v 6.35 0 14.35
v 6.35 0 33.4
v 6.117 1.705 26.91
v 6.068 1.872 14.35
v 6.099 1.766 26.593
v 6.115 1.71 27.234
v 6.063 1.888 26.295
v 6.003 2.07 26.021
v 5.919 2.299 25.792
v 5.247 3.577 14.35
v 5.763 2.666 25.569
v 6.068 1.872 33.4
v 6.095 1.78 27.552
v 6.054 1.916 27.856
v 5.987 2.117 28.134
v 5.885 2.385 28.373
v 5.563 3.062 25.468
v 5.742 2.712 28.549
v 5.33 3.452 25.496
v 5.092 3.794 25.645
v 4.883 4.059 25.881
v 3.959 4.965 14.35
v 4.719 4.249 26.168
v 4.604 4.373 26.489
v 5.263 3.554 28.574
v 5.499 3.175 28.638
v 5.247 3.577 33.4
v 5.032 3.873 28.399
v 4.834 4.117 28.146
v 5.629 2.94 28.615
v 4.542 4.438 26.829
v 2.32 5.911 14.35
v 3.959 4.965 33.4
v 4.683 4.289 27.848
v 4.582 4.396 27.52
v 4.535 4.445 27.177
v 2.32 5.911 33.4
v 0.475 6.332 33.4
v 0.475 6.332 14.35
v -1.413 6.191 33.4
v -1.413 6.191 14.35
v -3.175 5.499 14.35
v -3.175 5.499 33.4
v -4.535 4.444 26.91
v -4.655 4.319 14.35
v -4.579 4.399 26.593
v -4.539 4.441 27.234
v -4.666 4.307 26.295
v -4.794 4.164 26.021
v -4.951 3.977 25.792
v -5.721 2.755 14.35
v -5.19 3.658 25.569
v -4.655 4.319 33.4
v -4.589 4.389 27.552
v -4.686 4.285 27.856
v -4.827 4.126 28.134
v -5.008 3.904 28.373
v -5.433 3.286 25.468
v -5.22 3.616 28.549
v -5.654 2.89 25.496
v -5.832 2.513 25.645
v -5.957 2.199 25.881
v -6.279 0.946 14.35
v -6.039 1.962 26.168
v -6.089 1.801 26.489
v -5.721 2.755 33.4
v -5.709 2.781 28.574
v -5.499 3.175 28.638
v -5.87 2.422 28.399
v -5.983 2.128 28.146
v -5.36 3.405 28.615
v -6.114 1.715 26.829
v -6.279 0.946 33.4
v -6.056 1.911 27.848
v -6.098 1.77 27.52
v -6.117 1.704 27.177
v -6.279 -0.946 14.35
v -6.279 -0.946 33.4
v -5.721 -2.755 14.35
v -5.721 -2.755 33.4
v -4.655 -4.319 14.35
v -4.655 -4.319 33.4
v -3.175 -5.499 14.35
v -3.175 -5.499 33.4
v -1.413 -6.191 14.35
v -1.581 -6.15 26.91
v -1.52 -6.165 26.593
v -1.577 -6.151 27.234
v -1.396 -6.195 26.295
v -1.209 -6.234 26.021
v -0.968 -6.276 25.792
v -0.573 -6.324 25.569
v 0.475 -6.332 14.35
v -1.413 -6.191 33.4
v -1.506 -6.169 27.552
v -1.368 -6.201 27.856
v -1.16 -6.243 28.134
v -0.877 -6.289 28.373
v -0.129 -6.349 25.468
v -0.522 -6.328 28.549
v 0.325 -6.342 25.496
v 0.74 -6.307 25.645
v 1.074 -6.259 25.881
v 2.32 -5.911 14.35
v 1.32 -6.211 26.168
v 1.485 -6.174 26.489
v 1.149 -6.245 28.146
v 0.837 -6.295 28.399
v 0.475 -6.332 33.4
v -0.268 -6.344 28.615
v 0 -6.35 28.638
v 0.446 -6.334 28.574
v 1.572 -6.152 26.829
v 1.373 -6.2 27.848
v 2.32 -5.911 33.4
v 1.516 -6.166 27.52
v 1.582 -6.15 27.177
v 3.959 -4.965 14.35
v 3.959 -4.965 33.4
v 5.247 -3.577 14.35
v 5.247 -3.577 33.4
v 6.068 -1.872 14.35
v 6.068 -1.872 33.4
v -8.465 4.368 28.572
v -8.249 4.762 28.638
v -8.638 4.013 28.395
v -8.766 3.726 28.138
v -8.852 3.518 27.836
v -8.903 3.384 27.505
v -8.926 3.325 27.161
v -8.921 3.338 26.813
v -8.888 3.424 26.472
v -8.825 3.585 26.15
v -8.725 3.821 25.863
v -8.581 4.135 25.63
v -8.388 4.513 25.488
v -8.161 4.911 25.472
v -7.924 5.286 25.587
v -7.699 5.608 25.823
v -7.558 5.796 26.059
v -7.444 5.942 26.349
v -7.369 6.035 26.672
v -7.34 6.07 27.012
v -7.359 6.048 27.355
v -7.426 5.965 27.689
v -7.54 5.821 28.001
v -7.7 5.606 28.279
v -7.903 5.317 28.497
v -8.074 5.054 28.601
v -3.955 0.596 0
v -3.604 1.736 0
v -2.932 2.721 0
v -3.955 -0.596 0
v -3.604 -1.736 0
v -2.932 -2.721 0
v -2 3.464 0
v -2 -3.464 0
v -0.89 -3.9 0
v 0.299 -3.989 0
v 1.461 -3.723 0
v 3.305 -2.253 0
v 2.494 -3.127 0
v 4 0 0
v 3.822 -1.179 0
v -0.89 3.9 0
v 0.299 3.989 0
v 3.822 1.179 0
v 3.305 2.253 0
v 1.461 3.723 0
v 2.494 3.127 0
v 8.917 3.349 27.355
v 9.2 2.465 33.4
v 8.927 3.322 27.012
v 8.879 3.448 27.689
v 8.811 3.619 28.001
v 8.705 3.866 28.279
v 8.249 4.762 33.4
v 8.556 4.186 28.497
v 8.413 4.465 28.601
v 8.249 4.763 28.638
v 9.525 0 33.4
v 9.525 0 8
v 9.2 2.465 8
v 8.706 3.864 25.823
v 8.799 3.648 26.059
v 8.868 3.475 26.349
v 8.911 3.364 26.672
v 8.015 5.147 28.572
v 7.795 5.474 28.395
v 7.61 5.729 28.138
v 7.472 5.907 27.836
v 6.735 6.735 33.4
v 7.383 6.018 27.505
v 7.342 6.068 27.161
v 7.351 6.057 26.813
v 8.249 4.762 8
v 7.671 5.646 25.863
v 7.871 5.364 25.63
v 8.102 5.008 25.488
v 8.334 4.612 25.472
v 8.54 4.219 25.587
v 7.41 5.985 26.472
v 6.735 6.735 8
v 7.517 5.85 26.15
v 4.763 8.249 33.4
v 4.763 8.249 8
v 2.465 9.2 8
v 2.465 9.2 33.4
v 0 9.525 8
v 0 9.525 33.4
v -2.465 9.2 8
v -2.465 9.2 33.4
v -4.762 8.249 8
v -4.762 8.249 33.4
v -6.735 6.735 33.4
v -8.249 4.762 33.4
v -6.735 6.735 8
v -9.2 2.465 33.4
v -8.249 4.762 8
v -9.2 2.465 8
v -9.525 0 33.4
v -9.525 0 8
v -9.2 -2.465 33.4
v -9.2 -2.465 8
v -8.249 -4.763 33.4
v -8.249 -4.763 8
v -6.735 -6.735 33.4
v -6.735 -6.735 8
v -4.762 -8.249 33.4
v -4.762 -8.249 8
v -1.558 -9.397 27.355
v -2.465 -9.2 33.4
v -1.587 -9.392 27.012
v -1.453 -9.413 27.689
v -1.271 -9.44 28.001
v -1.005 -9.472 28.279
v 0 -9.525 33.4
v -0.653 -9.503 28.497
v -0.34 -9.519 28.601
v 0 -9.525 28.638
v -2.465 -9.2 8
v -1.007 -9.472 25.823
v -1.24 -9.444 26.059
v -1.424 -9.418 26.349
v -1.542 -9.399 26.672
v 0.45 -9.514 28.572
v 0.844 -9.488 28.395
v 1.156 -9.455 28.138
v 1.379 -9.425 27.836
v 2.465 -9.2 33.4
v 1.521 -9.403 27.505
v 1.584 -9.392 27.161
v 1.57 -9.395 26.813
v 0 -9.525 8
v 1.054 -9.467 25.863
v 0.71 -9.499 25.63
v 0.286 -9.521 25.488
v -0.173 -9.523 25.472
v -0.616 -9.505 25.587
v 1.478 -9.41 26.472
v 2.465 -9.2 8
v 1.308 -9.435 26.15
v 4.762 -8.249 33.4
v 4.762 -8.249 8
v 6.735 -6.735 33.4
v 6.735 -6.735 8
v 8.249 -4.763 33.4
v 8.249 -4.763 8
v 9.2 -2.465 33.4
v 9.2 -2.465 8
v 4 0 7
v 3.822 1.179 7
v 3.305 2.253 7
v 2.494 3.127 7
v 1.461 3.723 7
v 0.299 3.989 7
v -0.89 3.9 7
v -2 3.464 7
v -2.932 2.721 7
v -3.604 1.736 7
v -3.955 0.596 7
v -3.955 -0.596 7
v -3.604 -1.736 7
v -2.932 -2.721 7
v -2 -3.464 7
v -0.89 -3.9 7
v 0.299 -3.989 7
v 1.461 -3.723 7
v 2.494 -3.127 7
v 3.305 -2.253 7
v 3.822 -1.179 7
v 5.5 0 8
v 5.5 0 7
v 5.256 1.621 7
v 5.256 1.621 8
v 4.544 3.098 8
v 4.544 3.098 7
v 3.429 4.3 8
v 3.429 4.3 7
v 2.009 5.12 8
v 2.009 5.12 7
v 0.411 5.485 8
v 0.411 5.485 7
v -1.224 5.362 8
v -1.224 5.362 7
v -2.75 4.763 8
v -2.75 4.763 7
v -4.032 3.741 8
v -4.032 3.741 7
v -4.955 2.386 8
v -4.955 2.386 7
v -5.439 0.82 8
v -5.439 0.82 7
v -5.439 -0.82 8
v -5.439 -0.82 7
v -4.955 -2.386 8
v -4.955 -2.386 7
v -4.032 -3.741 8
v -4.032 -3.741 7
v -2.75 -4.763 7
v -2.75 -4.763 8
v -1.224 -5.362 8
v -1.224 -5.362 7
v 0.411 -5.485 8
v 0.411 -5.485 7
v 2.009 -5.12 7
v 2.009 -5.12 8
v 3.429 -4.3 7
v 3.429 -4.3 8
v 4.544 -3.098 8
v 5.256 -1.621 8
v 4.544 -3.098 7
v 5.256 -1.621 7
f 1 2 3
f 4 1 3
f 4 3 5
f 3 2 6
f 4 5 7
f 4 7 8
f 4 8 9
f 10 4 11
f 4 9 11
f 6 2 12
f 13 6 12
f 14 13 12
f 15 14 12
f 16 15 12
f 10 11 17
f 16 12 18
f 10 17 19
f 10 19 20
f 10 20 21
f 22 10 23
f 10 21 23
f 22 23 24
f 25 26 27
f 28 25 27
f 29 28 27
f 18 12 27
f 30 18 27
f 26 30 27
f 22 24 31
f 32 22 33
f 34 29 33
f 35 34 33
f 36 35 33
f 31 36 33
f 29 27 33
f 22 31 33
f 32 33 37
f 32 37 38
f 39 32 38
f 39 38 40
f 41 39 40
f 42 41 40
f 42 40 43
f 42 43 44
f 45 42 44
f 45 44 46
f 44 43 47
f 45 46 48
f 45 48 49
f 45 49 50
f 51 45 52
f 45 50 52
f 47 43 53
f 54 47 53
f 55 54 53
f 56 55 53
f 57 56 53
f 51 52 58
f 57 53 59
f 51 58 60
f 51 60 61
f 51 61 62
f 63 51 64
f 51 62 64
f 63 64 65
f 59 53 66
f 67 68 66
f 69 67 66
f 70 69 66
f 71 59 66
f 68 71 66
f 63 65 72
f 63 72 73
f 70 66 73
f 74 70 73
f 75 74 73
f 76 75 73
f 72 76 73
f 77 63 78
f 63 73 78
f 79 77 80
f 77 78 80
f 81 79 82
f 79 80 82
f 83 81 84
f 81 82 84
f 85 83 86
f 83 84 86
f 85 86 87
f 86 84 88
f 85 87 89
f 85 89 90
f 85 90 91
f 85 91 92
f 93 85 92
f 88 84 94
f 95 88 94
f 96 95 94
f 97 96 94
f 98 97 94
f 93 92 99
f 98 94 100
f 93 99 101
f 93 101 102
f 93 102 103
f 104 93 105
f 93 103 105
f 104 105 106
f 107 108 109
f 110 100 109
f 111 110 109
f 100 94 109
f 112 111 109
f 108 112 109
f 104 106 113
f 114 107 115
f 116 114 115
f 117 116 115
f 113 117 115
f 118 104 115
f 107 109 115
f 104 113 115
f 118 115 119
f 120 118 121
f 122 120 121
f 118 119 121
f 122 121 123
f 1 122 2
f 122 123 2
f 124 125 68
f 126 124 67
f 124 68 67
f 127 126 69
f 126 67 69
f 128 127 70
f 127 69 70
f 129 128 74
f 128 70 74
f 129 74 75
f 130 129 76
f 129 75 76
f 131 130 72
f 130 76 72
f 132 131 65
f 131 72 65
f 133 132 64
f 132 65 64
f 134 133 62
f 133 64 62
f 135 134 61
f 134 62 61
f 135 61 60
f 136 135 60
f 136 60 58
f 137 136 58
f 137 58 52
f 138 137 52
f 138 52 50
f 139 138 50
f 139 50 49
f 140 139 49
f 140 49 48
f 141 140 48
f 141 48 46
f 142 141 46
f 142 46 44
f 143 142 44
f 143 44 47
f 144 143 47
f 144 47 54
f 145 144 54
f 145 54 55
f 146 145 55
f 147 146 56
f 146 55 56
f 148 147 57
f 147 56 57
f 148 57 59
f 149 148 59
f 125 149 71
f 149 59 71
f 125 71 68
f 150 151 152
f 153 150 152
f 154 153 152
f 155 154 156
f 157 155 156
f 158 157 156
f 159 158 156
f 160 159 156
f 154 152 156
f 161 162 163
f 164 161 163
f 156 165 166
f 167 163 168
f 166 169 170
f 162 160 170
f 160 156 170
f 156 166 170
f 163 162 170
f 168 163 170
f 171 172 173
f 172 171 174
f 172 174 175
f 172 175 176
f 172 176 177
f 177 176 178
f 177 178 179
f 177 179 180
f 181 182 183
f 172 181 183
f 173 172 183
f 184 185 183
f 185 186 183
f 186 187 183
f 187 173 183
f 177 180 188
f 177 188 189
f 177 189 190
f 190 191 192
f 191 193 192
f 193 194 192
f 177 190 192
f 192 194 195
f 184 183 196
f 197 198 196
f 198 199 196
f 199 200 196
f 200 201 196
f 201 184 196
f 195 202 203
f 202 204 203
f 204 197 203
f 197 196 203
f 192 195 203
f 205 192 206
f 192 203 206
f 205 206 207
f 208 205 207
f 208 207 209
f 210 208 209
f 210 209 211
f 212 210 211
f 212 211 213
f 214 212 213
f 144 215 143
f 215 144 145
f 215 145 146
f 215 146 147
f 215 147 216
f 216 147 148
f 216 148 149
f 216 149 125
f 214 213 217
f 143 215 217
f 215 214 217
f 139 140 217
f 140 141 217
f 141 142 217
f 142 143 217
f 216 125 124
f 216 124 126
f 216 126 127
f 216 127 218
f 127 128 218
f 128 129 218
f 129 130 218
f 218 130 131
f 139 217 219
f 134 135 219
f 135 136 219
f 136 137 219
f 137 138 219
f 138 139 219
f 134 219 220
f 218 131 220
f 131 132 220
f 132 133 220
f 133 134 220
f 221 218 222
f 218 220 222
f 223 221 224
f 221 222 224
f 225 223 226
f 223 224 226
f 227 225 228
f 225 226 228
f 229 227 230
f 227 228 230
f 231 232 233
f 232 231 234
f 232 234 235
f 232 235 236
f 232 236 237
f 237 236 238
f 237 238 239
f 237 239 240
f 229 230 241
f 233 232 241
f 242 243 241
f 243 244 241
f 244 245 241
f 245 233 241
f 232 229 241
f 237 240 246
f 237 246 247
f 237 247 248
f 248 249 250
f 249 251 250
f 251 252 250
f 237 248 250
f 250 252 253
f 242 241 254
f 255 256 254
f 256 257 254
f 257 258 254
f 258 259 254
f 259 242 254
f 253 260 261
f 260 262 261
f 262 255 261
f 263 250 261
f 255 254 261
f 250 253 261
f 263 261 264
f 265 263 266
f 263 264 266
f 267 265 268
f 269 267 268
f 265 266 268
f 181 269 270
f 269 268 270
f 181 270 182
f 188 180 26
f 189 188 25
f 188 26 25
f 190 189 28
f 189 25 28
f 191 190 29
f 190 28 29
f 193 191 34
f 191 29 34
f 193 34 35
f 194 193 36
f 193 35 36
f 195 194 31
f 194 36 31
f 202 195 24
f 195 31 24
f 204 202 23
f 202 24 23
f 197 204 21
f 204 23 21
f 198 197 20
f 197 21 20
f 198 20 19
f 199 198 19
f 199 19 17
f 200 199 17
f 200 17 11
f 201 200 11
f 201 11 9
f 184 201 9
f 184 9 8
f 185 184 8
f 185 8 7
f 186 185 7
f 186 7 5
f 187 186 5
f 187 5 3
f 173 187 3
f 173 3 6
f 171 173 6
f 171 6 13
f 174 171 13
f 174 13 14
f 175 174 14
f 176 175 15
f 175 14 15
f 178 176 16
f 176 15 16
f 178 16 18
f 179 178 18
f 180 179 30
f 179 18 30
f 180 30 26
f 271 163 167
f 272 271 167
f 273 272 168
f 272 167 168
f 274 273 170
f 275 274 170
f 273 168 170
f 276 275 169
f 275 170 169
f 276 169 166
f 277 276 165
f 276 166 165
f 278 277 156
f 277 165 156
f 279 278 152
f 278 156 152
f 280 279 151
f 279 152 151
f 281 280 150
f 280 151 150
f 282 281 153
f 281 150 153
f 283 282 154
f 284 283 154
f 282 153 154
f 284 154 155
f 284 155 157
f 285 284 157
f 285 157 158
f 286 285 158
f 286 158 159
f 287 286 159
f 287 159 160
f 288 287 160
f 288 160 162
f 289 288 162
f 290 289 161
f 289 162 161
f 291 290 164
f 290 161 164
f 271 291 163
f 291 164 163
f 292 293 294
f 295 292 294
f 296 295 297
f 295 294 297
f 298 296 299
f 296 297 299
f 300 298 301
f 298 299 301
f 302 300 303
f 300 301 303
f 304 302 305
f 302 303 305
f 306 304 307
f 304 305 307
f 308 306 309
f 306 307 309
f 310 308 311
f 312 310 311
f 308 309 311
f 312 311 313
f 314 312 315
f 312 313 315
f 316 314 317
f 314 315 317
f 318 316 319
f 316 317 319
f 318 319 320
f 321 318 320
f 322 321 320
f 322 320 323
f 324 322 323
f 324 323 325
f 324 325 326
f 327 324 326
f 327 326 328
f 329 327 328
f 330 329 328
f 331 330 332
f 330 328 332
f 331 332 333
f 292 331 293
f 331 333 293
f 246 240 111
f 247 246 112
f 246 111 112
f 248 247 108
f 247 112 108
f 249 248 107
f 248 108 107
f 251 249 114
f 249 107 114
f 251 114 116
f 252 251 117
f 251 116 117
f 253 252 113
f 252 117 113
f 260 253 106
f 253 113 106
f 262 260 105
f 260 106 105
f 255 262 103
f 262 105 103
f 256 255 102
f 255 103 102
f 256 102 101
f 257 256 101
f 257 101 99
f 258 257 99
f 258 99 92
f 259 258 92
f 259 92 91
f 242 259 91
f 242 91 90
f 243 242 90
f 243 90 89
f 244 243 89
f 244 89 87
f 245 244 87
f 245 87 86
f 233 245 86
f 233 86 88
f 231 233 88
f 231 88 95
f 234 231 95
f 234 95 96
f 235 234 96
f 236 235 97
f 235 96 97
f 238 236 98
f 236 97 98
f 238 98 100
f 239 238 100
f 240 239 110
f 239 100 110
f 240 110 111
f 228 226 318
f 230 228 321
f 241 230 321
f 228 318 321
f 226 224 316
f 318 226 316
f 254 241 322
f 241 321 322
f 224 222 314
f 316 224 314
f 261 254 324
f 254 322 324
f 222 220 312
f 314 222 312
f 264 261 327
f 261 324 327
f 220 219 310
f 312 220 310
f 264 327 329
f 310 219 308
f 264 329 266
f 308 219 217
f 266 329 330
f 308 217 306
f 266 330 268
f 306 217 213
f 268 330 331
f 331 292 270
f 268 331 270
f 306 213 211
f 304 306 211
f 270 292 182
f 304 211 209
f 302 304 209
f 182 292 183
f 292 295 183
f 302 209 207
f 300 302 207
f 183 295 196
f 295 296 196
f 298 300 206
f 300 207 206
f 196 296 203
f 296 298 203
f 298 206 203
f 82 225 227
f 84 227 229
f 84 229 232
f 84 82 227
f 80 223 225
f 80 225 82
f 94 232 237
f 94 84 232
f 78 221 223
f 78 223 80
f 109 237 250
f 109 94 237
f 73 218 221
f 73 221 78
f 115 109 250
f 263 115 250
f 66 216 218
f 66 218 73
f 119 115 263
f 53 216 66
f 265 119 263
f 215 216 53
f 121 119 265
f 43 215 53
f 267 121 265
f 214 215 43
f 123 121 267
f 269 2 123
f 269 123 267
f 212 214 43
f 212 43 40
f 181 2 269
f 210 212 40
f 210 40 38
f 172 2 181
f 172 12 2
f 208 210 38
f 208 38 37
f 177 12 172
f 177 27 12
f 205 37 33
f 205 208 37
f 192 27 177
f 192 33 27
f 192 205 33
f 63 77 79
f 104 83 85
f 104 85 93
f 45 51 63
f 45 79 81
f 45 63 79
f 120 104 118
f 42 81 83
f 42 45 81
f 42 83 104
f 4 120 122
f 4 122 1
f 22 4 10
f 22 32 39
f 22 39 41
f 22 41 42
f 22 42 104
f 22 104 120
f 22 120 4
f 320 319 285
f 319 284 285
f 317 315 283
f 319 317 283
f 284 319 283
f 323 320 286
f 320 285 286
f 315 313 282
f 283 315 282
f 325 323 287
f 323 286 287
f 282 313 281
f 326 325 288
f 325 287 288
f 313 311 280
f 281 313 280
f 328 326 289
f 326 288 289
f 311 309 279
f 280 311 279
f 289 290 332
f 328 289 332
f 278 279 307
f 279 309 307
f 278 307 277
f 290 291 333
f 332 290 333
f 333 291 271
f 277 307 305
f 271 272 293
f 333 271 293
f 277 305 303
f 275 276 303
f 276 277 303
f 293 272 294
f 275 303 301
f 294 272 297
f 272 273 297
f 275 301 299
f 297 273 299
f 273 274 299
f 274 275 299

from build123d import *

# Parameters (mm, degrees)
SKETCH1_R           = 4
BOSS_EXTRUDE1_DEPTH = 7
SKETCH2_R           = 5.5
BOSS_EXTRUDE2_DEPTH = 1
SKETCH3_R           = 9.525
BOSS_EXTRUDE3_DEPTH = 25.4
SKETCH4_R           = 6.35
CUT_EXTRUDE1_DEPTH  = 19.05
SKETCH5_R           = 1.5875
CUT_EXTRUDE2_DEPTH  = 25.4
CIRPATTERN1_COUNT   = 3


with BuildPart() as part:
    # Sketch1 → Boss-Extrude1 (new body)
    with BuildSketch(Plane.XY):
        Circle(SKETCH1_R)
    extrude(amount=BOSS_EXTRUDE1_DEPTH)

    # Sketch2 → Boss-Extrude2 (add)
    with BuildSketch(Plane.XY.offset(7)):
        Circle(SKETCH2_R)
    extrude(amount=BOSS_EXTRUDE2_DEPTH)

    # Sketch3 → Boss-Extrude3 (add)
    with BuildSketch(Plane.XY.offset(8)):
        Circle(SKETCH3_R)
    extrude(amount=BOSS_EXTRUDE3_DEPTH)

    # Sketch4 → Cut-Extrude1 (cut)
    with BuildSketch(Plane.XY.offset(33.4)):
        Circle(SKETCH4_R)
    extrude(amount=-CUT_EXTRUDE1_DEPTH, mode=Mode.SUBTRACT)

    # Sketch5 → Cut-Extrude2 (cut)
    with BuildSketch(Plane(origin=(0, 0, 0), x_dir=(1, 0, 0), z_dir=(0, 1, 0))):
        with Locations(Location((0, -27.05, 0), (0, 0, 270))):
            Circle(SKETCH5_R)
    cut_extrude2 = extrude(amount=-CUT_EXTRUDE2_DEPTH, mode=Mode.SUBTRACT)

    # CirPattern1: Cut-Extrude2 ×3 about axis
    cirpattern1_axis = Axis((0, 0, 33.4), (0, 0, -1))
    for i in range(1, CIRPATTERN1_COUNT):
        add(cut_extrude2.rotate(cirpattern1_axis, i * 360 / CIRPATTERN1_COUNT), mode=Mode.SUBTRACT)


solid = part.part
